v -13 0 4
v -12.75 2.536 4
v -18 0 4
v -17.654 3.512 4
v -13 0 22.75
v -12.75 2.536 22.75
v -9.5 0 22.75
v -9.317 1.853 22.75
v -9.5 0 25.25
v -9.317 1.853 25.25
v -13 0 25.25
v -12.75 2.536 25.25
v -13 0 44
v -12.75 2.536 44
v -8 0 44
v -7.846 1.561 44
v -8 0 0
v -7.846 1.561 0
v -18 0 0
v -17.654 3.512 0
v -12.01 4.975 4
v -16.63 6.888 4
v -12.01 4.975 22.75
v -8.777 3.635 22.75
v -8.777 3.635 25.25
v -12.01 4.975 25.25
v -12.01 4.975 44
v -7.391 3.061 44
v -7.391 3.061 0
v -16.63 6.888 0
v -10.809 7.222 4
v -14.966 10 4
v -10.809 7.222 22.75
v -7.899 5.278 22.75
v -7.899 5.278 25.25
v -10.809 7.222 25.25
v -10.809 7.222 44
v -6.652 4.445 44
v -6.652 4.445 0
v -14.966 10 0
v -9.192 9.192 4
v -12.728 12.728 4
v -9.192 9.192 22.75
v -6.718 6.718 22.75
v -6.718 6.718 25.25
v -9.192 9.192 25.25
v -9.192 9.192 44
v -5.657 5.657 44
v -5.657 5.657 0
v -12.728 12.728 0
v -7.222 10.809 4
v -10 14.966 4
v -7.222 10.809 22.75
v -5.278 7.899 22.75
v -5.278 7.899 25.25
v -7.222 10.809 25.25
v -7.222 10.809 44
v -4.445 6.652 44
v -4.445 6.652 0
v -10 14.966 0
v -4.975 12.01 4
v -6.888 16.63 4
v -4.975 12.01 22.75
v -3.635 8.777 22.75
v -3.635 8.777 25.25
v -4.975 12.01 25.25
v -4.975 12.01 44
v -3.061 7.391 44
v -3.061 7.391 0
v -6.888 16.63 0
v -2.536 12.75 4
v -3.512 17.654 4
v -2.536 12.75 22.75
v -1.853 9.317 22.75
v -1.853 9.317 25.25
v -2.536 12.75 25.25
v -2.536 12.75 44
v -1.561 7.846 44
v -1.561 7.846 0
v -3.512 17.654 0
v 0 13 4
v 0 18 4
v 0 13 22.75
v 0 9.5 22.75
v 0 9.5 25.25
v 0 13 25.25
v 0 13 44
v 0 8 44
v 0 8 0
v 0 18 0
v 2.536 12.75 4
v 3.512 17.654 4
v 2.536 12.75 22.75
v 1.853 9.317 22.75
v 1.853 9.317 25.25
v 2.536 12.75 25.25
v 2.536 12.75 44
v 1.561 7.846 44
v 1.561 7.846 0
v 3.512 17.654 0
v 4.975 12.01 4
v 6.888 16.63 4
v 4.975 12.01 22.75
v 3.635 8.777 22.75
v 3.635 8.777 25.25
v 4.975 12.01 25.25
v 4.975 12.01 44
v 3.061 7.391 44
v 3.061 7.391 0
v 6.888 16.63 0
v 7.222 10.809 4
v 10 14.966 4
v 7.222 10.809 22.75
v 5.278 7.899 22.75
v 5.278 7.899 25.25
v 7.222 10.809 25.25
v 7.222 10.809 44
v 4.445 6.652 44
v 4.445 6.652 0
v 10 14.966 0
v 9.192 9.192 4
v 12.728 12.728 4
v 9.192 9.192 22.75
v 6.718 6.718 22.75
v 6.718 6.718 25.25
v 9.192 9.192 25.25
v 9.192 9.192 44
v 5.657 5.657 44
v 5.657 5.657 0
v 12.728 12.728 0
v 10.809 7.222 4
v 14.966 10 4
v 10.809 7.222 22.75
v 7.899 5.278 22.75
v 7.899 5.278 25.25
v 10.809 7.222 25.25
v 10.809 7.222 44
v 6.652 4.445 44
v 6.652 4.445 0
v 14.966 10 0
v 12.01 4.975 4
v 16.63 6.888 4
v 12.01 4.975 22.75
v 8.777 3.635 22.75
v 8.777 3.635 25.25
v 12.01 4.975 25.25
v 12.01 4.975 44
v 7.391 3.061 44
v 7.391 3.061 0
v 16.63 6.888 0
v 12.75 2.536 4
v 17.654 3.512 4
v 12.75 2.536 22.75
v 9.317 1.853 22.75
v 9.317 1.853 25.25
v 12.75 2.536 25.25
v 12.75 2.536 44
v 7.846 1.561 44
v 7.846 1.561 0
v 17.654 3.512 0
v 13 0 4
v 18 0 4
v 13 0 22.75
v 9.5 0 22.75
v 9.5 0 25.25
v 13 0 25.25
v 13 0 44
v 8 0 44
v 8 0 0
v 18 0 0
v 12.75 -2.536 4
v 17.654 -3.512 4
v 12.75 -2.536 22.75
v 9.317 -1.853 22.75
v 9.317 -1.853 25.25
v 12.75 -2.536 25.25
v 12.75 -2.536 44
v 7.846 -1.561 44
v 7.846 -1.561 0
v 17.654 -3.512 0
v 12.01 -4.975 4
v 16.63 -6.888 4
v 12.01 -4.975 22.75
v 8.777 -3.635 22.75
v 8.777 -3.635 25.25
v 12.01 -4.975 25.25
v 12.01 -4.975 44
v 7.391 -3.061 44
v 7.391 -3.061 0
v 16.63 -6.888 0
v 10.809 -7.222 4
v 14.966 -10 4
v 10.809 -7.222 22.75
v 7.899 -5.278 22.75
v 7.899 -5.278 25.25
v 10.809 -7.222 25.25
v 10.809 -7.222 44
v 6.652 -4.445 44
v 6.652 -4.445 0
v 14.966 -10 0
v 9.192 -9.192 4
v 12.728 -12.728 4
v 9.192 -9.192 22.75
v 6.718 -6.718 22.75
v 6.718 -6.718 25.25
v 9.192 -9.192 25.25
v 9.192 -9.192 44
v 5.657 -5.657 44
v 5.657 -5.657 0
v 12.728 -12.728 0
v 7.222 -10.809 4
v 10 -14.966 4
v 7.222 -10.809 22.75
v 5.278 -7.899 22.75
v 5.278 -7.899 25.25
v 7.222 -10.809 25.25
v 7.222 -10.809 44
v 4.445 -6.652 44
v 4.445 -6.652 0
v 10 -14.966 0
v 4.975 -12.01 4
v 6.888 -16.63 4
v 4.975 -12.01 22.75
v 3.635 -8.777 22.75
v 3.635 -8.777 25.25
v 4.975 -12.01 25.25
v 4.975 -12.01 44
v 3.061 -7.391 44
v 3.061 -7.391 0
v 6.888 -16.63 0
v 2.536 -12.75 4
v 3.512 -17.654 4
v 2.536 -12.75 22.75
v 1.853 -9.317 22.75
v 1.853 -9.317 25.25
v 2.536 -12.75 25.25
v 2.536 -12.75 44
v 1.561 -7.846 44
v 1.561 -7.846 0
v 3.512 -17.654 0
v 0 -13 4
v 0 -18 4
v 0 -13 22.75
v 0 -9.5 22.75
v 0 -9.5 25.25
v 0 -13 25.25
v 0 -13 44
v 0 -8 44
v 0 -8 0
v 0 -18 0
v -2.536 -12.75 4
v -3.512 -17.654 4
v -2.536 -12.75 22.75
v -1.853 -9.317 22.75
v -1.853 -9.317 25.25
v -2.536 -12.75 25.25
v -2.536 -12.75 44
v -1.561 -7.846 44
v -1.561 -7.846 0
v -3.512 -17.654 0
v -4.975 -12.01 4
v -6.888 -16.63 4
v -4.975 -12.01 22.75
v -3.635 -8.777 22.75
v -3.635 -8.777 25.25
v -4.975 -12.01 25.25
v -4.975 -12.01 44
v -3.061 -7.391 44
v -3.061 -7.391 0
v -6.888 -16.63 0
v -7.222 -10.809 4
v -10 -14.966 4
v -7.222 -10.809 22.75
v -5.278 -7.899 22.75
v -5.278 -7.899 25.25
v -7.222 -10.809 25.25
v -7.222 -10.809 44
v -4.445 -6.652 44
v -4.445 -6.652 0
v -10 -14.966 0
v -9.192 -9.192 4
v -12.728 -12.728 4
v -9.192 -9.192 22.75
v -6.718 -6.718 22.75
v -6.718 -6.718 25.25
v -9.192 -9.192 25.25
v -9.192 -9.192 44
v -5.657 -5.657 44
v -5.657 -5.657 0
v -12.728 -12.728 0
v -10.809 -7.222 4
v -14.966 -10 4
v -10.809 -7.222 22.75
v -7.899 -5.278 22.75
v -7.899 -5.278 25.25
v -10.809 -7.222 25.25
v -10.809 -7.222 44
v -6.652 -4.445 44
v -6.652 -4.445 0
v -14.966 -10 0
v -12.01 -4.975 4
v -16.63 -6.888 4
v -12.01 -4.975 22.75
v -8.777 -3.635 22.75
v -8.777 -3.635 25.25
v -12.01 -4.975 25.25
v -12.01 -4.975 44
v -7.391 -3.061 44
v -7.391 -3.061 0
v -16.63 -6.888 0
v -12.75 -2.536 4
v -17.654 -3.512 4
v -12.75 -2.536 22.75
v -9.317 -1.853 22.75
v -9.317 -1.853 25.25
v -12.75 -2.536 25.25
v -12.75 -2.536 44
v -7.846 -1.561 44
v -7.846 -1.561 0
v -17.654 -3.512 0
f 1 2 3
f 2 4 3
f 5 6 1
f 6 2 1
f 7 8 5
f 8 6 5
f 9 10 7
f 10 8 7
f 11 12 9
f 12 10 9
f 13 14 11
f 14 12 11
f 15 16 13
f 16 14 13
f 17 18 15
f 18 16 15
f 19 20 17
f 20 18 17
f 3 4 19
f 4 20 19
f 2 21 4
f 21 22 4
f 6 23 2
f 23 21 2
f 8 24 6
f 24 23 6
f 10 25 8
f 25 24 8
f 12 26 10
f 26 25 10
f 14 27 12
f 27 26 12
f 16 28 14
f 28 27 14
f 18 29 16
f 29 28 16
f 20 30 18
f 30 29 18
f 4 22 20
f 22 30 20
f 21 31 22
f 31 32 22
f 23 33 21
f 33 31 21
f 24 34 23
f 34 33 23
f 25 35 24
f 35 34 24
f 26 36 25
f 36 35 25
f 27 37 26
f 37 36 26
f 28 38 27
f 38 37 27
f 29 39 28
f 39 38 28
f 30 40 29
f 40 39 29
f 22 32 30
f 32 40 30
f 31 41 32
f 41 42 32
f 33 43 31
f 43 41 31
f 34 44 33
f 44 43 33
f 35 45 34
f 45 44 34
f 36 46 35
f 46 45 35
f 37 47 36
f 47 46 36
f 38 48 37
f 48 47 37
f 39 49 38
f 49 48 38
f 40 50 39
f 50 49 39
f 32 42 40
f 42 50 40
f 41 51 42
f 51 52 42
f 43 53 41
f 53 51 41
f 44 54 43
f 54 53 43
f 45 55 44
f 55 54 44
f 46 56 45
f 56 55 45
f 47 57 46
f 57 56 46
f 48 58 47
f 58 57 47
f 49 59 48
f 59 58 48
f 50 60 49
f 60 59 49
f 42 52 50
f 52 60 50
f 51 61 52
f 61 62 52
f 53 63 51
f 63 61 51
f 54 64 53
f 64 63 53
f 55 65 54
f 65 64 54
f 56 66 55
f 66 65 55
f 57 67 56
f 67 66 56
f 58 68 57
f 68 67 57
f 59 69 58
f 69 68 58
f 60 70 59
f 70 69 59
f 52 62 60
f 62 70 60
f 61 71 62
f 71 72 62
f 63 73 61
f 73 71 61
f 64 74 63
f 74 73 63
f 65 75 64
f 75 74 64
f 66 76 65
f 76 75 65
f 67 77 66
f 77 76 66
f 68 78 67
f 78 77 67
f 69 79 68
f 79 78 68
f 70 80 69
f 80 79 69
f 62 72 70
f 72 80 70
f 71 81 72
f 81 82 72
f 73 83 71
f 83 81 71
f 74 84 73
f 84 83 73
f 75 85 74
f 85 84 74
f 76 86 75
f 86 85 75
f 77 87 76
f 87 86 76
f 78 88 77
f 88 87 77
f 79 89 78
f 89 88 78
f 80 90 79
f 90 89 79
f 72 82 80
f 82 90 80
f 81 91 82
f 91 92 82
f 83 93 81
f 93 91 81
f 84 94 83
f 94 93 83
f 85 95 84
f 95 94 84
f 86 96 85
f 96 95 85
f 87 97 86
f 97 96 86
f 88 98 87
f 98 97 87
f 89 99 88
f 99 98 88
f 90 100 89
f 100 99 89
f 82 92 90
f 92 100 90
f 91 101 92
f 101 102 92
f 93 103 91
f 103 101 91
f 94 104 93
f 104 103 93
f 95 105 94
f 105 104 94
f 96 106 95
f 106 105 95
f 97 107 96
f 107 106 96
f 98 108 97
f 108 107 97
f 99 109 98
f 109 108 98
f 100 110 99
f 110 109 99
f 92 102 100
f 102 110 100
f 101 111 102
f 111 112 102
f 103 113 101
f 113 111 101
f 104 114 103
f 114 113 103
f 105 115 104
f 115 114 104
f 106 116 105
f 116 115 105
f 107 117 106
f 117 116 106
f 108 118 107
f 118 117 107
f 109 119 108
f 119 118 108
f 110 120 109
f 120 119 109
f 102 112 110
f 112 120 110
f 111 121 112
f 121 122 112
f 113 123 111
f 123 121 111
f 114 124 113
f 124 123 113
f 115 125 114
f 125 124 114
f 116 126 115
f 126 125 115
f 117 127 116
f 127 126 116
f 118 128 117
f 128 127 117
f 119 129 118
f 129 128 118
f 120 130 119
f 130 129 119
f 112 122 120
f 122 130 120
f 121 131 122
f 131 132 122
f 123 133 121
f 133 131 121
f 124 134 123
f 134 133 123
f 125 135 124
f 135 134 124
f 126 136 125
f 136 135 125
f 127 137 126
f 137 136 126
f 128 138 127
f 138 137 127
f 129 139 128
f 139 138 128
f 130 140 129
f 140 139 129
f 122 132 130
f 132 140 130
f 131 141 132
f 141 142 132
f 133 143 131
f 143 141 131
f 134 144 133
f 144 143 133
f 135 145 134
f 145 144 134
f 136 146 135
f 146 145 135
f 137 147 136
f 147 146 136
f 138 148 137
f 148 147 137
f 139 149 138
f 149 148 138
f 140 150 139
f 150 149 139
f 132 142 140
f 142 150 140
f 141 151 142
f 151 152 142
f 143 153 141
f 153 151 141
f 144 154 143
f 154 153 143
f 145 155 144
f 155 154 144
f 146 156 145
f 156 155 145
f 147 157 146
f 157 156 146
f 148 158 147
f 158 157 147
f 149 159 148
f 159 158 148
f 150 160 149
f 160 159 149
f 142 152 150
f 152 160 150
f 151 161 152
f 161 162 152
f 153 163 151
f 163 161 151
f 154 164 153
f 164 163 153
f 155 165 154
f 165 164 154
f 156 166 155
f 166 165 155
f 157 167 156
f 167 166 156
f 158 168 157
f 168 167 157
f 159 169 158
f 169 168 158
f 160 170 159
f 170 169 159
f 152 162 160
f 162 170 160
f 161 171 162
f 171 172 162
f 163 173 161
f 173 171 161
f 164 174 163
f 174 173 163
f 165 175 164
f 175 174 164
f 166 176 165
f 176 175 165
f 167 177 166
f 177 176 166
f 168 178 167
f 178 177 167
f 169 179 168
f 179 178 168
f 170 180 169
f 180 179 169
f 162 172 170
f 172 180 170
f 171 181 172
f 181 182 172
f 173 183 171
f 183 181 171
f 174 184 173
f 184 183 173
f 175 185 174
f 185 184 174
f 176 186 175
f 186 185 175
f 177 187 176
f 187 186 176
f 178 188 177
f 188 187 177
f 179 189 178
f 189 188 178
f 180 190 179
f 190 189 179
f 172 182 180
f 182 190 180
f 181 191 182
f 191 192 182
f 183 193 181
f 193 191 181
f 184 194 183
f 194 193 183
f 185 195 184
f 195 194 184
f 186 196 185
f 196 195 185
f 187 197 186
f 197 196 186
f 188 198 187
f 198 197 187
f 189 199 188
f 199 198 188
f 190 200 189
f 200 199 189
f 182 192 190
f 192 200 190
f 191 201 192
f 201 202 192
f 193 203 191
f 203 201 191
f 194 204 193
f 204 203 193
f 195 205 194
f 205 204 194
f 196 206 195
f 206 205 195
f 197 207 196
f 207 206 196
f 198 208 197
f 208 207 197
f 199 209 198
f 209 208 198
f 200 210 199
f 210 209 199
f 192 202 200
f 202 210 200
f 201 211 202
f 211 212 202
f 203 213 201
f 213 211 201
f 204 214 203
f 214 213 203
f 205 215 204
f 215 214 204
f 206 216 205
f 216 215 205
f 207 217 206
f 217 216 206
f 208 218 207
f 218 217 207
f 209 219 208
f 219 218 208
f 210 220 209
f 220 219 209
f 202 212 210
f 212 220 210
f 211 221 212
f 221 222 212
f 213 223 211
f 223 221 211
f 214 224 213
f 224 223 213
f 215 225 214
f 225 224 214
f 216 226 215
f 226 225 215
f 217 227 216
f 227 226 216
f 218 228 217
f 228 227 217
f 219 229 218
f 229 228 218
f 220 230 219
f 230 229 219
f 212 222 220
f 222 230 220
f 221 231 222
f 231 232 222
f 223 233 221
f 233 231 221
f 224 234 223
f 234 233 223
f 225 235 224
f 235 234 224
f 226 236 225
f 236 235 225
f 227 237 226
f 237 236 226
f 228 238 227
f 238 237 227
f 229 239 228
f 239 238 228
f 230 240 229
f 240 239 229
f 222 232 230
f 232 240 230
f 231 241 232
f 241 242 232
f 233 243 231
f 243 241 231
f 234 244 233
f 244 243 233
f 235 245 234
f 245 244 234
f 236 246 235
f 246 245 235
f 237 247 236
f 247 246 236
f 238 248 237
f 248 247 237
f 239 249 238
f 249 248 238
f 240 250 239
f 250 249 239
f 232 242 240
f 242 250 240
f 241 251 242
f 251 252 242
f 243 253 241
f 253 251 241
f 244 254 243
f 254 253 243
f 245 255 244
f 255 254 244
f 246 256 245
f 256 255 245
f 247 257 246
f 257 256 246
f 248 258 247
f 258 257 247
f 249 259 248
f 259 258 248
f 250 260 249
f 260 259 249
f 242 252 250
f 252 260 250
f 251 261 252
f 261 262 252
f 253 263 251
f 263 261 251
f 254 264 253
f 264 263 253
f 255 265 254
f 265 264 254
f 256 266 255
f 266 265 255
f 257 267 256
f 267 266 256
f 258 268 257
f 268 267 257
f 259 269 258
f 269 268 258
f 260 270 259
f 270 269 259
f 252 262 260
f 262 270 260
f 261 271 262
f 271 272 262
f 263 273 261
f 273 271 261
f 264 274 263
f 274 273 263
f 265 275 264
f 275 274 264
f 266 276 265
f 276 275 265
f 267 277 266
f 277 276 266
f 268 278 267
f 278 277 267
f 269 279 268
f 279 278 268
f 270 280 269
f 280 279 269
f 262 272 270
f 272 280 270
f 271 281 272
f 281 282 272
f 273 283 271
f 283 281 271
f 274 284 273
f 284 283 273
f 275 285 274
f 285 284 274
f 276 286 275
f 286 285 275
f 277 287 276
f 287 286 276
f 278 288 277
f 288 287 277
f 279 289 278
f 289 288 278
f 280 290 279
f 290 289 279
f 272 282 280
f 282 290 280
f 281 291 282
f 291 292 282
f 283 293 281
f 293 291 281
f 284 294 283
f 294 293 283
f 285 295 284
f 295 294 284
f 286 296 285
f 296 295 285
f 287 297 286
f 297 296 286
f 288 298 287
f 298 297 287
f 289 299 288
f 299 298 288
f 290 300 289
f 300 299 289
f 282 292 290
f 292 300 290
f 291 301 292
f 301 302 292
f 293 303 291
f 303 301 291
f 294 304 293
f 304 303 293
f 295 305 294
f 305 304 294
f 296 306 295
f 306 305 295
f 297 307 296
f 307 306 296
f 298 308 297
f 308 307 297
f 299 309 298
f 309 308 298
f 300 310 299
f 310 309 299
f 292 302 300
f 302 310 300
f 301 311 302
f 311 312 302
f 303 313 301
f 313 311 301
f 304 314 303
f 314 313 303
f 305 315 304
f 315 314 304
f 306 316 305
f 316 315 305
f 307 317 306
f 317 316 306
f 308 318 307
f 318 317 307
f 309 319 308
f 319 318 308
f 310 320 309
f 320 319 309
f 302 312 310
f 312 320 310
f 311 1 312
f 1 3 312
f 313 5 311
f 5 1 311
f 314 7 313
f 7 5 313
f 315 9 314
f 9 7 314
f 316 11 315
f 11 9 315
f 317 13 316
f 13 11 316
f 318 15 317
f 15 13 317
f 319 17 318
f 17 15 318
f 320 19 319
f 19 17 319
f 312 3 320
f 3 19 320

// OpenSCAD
$fn = 32;

// ----------------------------------------------------------------------
// Grooved revolve: flanged, bore R8
// ----------------------------------------------------------------------

// --- parameters (mm) ---
bore_r = 8;               // bore radius
outer_r = 13;             // outer radius of the body
total_h = 44;             // overall height, Z
wall = 5;                 // radial wall thickness
groove_w = 2.5;           // groove width
groove_d = 3.5;           // groove depth
grooves = 1;              // number of outer grooves
flange_r = 18;            // flange radius
flange_h = 4;             // flange height

bbox_x = 2 * flange_r;  // full diameter
bore_d = 2 * bore_r;  // bore diameter
body_d = 2 * outer_r;  // body diameter
flange_d = 2 * flange_r;  // flange diameter
revolve_angle = 360;  // full turn around the Z axis

profile = [[8, 0], [13, 0], [18, 0], [18, 4], [13, 4], [13, 22.75], [9.5, 22.75], [9.5, 25.25], [13, 25.25], [13, 44], [8, 44]];  // primary outline, 11 points, counter clockwise

// --- the one profile operation ---
rotate_extrude(angle = revolve_angle) polygon(points = profile);
